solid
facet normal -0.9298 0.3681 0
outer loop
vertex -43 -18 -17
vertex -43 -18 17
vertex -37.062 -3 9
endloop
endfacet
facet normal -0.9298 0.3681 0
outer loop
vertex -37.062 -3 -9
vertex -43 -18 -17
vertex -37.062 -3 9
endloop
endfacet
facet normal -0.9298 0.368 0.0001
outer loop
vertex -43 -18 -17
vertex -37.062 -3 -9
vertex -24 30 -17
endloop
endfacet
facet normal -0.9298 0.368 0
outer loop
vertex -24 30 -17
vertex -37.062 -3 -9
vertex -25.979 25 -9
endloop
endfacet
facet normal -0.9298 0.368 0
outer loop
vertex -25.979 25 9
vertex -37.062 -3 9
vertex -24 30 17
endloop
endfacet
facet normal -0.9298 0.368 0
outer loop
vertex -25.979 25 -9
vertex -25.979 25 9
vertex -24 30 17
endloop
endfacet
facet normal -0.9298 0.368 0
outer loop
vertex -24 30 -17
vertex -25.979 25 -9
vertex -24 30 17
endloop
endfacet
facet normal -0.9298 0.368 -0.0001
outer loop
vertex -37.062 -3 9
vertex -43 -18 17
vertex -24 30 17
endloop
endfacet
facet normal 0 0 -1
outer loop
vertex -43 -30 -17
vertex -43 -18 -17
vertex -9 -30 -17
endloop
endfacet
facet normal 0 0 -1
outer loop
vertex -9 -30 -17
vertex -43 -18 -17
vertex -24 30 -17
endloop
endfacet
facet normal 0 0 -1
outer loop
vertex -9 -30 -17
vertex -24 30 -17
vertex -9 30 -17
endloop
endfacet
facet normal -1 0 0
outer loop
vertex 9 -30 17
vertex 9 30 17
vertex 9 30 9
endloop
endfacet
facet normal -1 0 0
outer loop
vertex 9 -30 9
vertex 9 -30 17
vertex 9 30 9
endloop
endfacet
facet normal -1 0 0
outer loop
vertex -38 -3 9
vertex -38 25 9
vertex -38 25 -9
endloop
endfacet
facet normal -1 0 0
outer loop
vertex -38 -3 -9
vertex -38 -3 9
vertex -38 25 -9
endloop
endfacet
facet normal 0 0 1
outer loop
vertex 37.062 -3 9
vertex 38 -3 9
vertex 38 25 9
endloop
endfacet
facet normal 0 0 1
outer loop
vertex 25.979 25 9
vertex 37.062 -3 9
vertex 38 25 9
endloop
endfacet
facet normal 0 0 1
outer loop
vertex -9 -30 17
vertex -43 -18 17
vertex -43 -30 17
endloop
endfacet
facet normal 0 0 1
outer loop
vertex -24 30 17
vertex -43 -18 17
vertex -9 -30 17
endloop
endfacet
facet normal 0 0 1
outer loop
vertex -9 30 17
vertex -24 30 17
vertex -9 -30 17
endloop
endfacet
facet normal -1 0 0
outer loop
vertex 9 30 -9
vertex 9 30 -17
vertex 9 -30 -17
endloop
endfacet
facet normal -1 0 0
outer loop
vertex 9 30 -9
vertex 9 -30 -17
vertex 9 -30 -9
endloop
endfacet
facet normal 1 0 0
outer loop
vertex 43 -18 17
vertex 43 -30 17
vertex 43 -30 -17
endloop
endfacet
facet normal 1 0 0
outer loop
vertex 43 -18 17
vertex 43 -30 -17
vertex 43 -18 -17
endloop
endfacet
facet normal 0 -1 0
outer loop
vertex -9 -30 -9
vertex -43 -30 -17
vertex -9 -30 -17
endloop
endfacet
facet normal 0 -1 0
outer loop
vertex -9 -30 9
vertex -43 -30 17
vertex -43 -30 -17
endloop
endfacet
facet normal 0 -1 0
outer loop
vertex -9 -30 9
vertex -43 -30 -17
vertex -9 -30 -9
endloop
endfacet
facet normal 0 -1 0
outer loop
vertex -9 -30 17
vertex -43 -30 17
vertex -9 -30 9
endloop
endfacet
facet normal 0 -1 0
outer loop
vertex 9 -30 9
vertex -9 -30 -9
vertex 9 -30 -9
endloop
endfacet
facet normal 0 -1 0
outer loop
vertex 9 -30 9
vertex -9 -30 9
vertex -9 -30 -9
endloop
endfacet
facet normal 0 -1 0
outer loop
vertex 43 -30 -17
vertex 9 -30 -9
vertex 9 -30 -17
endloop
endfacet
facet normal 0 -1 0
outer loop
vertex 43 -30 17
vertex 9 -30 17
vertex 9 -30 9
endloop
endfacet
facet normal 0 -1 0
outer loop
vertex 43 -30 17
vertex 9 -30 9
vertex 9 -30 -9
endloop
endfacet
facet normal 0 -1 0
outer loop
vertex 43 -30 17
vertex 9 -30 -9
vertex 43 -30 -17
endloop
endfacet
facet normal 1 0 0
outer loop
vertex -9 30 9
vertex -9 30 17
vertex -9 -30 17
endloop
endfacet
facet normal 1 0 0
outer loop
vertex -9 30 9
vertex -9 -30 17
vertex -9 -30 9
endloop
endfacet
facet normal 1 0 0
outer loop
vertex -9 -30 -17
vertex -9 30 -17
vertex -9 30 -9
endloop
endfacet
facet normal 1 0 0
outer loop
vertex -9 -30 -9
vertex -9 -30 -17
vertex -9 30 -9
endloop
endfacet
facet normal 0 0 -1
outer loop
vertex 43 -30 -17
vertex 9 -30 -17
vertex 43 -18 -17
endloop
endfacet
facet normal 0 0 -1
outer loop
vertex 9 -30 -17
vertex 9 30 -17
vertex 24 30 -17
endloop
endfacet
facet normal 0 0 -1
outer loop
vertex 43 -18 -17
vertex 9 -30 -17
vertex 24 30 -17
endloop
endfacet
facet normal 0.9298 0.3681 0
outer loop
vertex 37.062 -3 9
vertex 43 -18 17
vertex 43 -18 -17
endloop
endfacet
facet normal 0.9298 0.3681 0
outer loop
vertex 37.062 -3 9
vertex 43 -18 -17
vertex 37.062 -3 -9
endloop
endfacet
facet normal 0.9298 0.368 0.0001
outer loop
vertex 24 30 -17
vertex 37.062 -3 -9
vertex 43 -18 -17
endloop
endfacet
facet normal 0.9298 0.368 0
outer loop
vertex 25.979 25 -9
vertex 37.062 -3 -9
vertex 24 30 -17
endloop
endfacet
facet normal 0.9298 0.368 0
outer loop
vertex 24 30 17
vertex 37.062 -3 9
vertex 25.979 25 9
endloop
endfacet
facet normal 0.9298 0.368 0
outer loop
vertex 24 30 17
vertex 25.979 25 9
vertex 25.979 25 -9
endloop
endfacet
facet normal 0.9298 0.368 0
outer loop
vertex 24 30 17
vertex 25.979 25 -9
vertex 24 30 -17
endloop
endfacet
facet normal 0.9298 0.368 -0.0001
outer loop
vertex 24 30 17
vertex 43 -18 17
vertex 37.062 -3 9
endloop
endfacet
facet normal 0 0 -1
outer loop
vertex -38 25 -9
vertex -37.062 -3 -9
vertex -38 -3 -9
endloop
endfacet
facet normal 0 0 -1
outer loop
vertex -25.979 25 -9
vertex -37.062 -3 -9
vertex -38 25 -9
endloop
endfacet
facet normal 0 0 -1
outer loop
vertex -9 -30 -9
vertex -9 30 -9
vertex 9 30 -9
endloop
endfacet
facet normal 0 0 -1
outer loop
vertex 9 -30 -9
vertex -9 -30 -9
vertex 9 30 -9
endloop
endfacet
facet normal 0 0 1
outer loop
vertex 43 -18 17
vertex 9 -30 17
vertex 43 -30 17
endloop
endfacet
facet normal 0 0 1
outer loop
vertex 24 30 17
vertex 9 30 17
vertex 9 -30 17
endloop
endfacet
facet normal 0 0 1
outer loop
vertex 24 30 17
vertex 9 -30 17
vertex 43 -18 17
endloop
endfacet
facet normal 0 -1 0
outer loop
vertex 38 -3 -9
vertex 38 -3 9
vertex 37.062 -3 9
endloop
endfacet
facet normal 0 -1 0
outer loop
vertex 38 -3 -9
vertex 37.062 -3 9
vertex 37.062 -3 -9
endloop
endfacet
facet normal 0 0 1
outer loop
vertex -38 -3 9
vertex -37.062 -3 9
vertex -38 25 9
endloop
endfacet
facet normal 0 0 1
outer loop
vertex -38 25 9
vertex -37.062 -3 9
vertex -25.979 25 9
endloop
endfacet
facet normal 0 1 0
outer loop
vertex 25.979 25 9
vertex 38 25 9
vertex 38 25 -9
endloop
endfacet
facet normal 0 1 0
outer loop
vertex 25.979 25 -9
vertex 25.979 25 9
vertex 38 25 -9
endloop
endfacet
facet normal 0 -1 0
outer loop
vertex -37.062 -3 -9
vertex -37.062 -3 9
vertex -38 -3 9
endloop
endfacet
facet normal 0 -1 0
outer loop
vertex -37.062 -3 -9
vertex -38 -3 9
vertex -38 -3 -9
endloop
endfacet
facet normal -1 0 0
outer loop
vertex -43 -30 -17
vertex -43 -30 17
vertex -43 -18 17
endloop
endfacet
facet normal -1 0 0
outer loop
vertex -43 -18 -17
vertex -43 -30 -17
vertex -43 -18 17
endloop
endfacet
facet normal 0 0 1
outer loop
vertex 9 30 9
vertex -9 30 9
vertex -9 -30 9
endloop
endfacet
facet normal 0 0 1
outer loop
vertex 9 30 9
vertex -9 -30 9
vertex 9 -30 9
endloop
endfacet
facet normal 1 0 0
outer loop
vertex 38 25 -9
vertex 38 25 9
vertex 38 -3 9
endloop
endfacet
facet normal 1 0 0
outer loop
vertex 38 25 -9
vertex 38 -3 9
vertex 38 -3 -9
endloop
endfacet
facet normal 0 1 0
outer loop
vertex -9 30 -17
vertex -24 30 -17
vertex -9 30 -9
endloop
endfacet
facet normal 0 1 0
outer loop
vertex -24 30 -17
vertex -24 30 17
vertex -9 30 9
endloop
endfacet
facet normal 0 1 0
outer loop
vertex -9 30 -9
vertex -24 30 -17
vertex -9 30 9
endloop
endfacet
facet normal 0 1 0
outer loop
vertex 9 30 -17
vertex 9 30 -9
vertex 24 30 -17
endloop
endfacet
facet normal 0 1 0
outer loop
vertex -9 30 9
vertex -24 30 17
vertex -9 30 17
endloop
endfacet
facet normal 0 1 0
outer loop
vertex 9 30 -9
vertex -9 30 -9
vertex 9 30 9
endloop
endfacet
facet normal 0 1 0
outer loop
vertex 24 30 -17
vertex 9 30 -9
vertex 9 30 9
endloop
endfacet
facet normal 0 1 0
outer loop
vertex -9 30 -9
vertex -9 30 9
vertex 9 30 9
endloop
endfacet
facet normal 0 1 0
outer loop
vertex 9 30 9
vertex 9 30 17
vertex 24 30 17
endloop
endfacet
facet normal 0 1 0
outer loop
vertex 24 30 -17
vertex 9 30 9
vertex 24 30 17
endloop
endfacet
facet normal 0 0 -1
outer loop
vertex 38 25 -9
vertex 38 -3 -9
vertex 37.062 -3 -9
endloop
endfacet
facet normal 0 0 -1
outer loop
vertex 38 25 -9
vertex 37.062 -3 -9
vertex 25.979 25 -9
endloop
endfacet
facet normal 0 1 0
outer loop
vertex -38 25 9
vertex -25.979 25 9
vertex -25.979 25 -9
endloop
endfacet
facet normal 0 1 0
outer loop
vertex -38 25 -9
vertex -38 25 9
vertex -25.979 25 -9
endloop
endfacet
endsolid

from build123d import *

# Parameters (mm, degrees)
SKETCH1_W           = 86
SKETCH1_H           = 60
BOSS_EXTRUDE1_DEPTH = 17
SKETCH2_W           = 18
SKETCH2_H           = 8
CUT_EXTRUDE1_DEPTH  = 56.118055118
CUT_EXTRUDE3_DEPTH  = 56.118055118
SKETCH4_W           = 18
SKETCH4_H           = 28
BOSS_EXTRUDE2_DEPTH = 38


with BuildPart() as part:
    # Sketch1 → Boss-Extrude1 (new, symmetric)
    with BuildSketch(Plane.XY):
        Rectangle(SKETCH1_W, SKETCH1_H)
    extrude(amount=BOSS_EXTRUDE1_DEPTH, both=True)

    # Sketch2 → Cut-Extrude1 (cut, symmetric)
    with BuildSketch(Plane(origin=(0, 0, 0), x_dir=(1, 0, 0), z_dir=(0, 1, 0))):
        with Locations((0, -13)):
            Rectangle(SKETCH2_W, SKETCH2_H)
    cut_extrude1 = extrude(amount=CUT_EXTRUDE1_DEPTH, both=True, mode=Mode.SUBTRACT)

    # Mirror1: Cut-Extrude1 across plane
    add(cut_extrude1.mirror(Plane.XY), mode=Mode.SUBTRACT)

    # Sketch3 → Cut-Extrude3 (cut, symmetric)
    with BuildSketch(Plane.XY):
        Polygon((-43, 30), (-43, -18), (-24, 30), align=None)
    cut_extrude3 = extrude(amount=CUT_EXTRUDE3_DEPTH, both=True, mode=Mode.SUBTRACT)

    # Mirror2: Cut-Extrude3 across plane
    add(cut_extrude3.mirror(Plane(origin=(0, 0, 0), x_dir=(0, 0, 1), z_dir=(1, 0, 0))), mode=Mode.SUBTRACT)

    # Sketch4 → Boss-Extrude2 (add, symmetric)
    with BuildSketch(Plane(origin=(0, 0, 0), x_dir=(0, 0, -1), z_dir=(1, 0, 0))):
        with Locations((0, 11)):
            Rectangle(SKETCH4_W, SKETCH4_H)
    extrude(amount=BOSS_EXTRUDE2_DEPTH, both=True)


solid = part.part
